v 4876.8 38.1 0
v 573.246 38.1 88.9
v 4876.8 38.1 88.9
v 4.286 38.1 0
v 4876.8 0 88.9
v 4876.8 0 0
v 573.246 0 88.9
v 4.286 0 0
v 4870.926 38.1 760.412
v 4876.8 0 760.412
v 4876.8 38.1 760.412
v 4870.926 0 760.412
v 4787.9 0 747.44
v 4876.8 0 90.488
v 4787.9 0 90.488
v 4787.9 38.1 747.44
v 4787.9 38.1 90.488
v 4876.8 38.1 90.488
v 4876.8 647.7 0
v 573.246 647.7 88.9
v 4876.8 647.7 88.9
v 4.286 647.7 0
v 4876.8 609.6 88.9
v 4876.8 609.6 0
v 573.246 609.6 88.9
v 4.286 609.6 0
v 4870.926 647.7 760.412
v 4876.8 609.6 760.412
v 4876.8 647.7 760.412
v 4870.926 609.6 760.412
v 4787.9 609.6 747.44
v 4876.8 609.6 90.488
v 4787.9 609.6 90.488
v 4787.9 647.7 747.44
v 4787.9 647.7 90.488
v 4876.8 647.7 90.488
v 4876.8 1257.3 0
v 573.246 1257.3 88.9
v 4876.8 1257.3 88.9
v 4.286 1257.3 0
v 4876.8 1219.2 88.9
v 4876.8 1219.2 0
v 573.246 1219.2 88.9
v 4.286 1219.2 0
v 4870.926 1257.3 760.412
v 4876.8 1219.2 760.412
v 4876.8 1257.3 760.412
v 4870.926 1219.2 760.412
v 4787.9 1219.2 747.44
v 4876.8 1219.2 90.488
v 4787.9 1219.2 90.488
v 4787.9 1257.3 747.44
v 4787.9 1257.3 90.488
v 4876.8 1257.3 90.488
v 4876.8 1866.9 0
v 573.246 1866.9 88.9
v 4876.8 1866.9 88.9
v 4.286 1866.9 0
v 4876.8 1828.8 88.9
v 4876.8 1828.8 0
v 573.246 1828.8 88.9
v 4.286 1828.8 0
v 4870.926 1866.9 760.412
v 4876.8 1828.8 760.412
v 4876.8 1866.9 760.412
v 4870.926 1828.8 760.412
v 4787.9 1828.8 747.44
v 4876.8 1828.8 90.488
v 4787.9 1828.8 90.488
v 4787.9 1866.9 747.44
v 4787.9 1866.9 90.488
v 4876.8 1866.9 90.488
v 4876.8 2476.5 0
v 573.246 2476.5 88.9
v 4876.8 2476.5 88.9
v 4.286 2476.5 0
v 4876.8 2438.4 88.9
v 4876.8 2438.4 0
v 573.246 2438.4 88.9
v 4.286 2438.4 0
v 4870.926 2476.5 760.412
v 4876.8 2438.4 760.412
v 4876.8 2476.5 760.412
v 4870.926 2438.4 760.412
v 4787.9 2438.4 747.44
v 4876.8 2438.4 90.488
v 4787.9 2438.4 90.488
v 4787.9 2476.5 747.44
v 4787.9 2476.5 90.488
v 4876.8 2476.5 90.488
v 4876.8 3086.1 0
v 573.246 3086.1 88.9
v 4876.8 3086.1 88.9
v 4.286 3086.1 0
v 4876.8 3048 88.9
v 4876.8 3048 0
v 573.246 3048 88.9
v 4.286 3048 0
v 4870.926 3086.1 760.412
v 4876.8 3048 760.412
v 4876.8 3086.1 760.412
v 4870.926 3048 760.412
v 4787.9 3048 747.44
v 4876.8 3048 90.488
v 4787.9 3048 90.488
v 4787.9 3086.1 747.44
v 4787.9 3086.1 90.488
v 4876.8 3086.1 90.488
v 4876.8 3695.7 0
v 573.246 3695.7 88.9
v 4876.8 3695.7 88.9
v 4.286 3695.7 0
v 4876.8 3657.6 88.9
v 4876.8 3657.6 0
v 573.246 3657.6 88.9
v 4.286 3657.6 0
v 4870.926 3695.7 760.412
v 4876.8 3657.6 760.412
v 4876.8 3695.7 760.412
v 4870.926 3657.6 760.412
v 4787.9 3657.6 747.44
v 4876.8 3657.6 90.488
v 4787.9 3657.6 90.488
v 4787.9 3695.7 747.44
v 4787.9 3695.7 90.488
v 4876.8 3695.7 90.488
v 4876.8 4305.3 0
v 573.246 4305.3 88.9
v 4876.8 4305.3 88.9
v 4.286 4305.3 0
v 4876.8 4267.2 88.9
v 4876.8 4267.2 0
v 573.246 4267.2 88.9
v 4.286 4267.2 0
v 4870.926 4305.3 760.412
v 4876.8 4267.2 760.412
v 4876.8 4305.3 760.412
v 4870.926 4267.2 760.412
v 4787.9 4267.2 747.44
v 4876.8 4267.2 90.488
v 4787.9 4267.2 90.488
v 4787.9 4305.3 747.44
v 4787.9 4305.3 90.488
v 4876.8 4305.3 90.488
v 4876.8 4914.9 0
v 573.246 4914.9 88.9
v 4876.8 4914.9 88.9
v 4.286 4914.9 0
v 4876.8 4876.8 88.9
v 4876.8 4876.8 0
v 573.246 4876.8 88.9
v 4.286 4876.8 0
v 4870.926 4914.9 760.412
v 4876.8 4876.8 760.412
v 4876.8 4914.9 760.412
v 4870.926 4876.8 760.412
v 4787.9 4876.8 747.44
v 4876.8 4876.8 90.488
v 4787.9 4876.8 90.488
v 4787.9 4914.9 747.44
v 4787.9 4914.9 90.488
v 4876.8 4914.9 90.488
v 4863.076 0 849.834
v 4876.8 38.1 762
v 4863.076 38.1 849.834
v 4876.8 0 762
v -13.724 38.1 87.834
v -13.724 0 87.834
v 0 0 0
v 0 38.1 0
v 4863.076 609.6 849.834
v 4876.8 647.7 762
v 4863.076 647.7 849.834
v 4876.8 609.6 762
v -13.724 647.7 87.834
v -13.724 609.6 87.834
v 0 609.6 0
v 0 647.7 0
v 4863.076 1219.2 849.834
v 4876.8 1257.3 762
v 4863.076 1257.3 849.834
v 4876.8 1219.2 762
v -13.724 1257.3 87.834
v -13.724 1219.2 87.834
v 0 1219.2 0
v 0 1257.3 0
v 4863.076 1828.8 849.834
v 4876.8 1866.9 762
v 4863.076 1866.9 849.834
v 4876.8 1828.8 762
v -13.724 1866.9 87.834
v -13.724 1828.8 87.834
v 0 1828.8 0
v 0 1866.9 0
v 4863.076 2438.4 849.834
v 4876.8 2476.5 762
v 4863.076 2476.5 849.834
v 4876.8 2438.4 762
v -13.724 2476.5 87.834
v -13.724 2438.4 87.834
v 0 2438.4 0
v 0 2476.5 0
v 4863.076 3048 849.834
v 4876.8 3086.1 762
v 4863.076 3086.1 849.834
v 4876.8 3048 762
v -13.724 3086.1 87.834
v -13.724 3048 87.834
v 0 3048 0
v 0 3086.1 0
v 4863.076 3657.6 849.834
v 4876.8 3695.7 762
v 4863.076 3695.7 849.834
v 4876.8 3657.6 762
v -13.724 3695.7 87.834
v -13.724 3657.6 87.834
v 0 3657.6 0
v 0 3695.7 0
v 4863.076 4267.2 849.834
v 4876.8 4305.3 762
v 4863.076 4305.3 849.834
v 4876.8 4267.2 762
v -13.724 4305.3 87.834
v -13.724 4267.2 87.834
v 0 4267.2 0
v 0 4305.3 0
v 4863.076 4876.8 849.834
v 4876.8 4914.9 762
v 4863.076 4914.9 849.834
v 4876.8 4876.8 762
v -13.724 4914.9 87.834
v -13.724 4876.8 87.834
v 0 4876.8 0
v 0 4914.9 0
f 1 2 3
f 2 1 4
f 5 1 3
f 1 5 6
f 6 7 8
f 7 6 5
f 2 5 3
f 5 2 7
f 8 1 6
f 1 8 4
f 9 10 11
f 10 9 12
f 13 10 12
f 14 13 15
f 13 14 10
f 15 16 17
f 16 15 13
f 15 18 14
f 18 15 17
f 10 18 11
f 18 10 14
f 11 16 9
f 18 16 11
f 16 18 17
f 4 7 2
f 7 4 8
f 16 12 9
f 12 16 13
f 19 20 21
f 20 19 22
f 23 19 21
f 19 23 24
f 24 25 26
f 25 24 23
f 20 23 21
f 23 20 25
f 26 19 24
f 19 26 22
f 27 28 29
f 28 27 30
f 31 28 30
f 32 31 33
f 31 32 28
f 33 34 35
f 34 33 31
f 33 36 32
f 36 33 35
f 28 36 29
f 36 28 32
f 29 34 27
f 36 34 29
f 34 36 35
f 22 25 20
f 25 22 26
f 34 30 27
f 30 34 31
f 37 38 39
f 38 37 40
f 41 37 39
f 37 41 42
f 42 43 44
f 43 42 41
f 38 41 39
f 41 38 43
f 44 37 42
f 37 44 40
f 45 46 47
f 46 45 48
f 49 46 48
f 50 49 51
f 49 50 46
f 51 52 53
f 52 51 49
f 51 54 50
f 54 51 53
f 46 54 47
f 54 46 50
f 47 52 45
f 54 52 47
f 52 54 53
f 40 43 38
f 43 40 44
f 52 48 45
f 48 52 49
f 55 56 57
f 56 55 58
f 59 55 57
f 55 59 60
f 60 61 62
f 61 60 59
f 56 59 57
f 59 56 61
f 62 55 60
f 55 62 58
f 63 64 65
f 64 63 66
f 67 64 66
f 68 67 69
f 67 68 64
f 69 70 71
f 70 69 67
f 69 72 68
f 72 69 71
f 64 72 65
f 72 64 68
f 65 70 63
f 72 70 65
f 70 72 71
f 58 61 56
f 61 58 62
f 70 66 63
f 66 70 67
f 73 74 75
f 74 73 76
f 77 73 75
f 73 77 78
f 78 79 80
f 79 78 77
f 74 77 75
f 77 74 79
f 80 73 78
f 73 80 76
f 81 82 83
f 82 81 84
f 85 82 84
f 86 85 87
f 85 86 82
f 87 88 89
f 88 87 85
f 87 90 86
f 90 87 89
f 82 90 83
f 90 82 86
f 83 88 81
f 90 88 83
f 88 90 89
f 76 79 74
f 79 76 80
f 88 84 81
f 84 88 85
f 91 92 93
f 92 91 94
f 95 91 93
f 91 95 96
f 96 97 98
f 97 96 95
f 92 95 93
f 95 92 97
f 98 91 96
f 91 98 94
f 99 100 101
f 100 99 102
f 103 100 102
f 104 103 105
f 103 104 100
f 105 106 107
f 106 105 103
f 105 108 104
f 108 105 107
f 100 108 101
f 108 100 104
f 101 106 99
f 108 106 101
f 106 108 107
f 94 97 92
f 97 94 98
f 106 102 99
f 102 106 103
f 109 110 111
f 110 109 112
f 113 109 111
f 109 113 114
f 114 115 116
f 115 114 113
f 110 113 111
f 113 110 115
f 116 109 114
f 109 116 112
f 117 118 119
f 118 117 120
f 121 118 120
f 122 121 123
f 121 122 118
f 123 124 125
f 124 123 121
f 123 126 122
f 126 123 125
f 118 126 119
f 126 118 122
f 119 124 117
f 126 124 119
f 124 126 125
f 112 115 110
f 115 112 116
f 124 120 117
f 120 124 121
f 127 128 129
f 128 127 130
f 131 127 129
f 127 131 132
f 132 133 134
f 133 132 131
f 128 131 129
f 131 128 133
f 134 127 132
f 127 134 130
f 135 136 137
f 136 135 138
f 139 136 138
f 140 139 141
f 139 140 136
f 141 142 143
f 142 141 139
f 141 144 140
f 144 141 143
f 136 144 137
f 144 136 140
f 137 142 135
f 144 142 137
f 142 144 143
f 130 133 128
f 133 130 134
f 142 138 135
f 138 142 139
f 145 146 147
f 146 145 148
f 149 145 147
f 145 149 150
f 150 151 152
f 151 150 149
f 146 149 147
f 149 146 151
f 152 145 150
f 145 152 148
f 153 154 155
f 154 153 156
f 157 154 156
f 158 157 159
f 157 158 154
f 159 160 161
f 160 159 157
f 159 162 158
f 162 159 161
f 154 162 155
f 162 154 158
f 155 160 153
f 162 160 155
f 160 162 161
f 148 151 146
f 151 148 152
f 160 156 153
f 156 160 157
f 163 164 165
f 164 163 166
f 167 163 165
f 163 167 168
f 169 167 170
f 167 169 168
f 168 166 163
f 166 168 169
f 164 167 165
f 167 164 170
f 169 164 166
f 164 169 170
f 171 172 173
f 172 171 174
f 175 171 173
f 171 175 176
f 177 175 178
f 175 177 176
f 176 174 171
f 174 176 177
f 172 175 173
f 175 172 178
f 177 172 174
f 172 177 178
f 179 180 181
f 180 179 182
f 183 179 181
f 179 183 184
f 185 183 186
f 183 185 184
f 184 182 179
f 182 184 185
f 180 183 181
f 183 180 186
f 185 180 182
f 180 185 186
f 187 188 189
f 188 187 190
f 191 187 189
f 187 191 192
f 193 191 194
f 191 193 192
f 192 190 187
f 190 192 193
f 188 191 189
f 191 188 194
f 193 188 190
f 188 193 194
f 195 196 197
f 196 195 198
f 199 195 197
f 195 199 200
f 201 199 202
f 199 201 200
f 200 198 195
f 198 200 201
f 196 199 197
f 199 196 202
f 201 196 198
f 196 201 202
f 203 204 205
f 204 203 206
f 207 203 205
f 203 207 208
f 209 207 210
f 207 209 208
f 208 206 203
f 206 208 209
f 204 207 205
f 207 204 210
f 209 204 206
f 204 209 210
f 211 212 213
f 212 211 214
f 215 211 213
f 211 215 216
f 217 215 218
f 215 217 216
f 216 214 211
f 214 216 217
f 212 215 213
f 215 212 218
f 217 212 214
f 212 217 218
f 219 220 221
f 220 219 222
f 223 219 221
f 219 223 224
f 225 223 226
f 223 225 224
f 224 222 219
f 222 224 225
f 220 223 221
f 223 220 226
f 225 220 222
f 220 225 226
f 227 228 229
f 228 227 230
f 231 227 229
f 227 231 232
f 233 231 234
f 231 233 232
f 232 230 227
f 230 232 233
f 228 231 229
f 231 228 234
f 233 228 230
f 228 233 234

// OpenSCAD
// https://www.mycarpentry.com/rafter-span-tables.html

// Dimensions of the requested roof
Roof_Dimensions = [192, 30, 192];

// Dimensions of the rafters to use
Rafter_Dimensions = [1.5, 3.5, 192];

// On center rafter spacing
Rafter_Spacing = 24;

// Object spacing to avoid merging on export
Object_Spacing = 0.0625;

// Scale factor useful when importing to other software (ex. 25.4 for inches);
Scale_Factor = 25.4;

module rafter(i, angle, length, e = 0) {
	translate([-(e/2), Rafter_Dimensions[0] + i - Rafter_Dimensions[0] - (e / 2), - (e/2)])
	rotate([0, 90 - angle, 0])
	rotate([0, 0, 90])
	cube([Rafter_Dimensions[0] + e, Rafter_Dimensions[1] + e, length + e]);
}

module roof() {
	angle = atan(Roof_Dimensions[1] / Roof_Dimensions[0]);
	rafter_length = sqrt(pow(Roof_Dimensions[0], 2) + pow(Roof_Dimensions[1], 2));

	for (i = [0:Rafter_Spacing:Roof_Dimensions[2]]) {
		rafter(i, angle, rafter_length);
		
		difference() {
			union() {
				// span
				translate([0, Rafter_Dimensions[0] + i - Rafter_Dimensions[0], 0])
				rotate([0, 90, 0])
				rotate([0, 0, 90])
				cube([Rafter_Dimensions[0], Rafter_Dimensions[1], Roof_Dimensions[0]]);
				
				// riser
				translate([Roof_Dimensions[0], Rafter_Dimensions[0] + i - Rafter_Dimensions[0], Rafter_Dimensions[1] + Object_Spacing])
				rotate([0, 0, 90])
				cube([Rafter_Dimensions[0], Rafter_Dimensions[1], Roof_Dimensions[1] - Rafter_Dimensions[1] - (Object_Spacing * 2)]);
			}

			rafter(i, angle, rafter_length, Object_Spacing);
		}
	}
	
	/* spacers
	for (i = [1:Rafter_Spacing:Roof_Dimensions[2]]) {
		translate([Roof_Dimensions[0], Rafter_Dimensions[0] + Object_Spacing, 0])
		rotate([-90, -180, 0])
		cube([Rafter_Dimensions[0], Rafter_Dimensions[1], Rafter_Spacing - (Rafter_Dimensions[0]) - (Object_Spacing * 2)]);
	}
	*/
};

scale([Scale_Factor, Scale_Factor, Scale_Factor])
roof();
